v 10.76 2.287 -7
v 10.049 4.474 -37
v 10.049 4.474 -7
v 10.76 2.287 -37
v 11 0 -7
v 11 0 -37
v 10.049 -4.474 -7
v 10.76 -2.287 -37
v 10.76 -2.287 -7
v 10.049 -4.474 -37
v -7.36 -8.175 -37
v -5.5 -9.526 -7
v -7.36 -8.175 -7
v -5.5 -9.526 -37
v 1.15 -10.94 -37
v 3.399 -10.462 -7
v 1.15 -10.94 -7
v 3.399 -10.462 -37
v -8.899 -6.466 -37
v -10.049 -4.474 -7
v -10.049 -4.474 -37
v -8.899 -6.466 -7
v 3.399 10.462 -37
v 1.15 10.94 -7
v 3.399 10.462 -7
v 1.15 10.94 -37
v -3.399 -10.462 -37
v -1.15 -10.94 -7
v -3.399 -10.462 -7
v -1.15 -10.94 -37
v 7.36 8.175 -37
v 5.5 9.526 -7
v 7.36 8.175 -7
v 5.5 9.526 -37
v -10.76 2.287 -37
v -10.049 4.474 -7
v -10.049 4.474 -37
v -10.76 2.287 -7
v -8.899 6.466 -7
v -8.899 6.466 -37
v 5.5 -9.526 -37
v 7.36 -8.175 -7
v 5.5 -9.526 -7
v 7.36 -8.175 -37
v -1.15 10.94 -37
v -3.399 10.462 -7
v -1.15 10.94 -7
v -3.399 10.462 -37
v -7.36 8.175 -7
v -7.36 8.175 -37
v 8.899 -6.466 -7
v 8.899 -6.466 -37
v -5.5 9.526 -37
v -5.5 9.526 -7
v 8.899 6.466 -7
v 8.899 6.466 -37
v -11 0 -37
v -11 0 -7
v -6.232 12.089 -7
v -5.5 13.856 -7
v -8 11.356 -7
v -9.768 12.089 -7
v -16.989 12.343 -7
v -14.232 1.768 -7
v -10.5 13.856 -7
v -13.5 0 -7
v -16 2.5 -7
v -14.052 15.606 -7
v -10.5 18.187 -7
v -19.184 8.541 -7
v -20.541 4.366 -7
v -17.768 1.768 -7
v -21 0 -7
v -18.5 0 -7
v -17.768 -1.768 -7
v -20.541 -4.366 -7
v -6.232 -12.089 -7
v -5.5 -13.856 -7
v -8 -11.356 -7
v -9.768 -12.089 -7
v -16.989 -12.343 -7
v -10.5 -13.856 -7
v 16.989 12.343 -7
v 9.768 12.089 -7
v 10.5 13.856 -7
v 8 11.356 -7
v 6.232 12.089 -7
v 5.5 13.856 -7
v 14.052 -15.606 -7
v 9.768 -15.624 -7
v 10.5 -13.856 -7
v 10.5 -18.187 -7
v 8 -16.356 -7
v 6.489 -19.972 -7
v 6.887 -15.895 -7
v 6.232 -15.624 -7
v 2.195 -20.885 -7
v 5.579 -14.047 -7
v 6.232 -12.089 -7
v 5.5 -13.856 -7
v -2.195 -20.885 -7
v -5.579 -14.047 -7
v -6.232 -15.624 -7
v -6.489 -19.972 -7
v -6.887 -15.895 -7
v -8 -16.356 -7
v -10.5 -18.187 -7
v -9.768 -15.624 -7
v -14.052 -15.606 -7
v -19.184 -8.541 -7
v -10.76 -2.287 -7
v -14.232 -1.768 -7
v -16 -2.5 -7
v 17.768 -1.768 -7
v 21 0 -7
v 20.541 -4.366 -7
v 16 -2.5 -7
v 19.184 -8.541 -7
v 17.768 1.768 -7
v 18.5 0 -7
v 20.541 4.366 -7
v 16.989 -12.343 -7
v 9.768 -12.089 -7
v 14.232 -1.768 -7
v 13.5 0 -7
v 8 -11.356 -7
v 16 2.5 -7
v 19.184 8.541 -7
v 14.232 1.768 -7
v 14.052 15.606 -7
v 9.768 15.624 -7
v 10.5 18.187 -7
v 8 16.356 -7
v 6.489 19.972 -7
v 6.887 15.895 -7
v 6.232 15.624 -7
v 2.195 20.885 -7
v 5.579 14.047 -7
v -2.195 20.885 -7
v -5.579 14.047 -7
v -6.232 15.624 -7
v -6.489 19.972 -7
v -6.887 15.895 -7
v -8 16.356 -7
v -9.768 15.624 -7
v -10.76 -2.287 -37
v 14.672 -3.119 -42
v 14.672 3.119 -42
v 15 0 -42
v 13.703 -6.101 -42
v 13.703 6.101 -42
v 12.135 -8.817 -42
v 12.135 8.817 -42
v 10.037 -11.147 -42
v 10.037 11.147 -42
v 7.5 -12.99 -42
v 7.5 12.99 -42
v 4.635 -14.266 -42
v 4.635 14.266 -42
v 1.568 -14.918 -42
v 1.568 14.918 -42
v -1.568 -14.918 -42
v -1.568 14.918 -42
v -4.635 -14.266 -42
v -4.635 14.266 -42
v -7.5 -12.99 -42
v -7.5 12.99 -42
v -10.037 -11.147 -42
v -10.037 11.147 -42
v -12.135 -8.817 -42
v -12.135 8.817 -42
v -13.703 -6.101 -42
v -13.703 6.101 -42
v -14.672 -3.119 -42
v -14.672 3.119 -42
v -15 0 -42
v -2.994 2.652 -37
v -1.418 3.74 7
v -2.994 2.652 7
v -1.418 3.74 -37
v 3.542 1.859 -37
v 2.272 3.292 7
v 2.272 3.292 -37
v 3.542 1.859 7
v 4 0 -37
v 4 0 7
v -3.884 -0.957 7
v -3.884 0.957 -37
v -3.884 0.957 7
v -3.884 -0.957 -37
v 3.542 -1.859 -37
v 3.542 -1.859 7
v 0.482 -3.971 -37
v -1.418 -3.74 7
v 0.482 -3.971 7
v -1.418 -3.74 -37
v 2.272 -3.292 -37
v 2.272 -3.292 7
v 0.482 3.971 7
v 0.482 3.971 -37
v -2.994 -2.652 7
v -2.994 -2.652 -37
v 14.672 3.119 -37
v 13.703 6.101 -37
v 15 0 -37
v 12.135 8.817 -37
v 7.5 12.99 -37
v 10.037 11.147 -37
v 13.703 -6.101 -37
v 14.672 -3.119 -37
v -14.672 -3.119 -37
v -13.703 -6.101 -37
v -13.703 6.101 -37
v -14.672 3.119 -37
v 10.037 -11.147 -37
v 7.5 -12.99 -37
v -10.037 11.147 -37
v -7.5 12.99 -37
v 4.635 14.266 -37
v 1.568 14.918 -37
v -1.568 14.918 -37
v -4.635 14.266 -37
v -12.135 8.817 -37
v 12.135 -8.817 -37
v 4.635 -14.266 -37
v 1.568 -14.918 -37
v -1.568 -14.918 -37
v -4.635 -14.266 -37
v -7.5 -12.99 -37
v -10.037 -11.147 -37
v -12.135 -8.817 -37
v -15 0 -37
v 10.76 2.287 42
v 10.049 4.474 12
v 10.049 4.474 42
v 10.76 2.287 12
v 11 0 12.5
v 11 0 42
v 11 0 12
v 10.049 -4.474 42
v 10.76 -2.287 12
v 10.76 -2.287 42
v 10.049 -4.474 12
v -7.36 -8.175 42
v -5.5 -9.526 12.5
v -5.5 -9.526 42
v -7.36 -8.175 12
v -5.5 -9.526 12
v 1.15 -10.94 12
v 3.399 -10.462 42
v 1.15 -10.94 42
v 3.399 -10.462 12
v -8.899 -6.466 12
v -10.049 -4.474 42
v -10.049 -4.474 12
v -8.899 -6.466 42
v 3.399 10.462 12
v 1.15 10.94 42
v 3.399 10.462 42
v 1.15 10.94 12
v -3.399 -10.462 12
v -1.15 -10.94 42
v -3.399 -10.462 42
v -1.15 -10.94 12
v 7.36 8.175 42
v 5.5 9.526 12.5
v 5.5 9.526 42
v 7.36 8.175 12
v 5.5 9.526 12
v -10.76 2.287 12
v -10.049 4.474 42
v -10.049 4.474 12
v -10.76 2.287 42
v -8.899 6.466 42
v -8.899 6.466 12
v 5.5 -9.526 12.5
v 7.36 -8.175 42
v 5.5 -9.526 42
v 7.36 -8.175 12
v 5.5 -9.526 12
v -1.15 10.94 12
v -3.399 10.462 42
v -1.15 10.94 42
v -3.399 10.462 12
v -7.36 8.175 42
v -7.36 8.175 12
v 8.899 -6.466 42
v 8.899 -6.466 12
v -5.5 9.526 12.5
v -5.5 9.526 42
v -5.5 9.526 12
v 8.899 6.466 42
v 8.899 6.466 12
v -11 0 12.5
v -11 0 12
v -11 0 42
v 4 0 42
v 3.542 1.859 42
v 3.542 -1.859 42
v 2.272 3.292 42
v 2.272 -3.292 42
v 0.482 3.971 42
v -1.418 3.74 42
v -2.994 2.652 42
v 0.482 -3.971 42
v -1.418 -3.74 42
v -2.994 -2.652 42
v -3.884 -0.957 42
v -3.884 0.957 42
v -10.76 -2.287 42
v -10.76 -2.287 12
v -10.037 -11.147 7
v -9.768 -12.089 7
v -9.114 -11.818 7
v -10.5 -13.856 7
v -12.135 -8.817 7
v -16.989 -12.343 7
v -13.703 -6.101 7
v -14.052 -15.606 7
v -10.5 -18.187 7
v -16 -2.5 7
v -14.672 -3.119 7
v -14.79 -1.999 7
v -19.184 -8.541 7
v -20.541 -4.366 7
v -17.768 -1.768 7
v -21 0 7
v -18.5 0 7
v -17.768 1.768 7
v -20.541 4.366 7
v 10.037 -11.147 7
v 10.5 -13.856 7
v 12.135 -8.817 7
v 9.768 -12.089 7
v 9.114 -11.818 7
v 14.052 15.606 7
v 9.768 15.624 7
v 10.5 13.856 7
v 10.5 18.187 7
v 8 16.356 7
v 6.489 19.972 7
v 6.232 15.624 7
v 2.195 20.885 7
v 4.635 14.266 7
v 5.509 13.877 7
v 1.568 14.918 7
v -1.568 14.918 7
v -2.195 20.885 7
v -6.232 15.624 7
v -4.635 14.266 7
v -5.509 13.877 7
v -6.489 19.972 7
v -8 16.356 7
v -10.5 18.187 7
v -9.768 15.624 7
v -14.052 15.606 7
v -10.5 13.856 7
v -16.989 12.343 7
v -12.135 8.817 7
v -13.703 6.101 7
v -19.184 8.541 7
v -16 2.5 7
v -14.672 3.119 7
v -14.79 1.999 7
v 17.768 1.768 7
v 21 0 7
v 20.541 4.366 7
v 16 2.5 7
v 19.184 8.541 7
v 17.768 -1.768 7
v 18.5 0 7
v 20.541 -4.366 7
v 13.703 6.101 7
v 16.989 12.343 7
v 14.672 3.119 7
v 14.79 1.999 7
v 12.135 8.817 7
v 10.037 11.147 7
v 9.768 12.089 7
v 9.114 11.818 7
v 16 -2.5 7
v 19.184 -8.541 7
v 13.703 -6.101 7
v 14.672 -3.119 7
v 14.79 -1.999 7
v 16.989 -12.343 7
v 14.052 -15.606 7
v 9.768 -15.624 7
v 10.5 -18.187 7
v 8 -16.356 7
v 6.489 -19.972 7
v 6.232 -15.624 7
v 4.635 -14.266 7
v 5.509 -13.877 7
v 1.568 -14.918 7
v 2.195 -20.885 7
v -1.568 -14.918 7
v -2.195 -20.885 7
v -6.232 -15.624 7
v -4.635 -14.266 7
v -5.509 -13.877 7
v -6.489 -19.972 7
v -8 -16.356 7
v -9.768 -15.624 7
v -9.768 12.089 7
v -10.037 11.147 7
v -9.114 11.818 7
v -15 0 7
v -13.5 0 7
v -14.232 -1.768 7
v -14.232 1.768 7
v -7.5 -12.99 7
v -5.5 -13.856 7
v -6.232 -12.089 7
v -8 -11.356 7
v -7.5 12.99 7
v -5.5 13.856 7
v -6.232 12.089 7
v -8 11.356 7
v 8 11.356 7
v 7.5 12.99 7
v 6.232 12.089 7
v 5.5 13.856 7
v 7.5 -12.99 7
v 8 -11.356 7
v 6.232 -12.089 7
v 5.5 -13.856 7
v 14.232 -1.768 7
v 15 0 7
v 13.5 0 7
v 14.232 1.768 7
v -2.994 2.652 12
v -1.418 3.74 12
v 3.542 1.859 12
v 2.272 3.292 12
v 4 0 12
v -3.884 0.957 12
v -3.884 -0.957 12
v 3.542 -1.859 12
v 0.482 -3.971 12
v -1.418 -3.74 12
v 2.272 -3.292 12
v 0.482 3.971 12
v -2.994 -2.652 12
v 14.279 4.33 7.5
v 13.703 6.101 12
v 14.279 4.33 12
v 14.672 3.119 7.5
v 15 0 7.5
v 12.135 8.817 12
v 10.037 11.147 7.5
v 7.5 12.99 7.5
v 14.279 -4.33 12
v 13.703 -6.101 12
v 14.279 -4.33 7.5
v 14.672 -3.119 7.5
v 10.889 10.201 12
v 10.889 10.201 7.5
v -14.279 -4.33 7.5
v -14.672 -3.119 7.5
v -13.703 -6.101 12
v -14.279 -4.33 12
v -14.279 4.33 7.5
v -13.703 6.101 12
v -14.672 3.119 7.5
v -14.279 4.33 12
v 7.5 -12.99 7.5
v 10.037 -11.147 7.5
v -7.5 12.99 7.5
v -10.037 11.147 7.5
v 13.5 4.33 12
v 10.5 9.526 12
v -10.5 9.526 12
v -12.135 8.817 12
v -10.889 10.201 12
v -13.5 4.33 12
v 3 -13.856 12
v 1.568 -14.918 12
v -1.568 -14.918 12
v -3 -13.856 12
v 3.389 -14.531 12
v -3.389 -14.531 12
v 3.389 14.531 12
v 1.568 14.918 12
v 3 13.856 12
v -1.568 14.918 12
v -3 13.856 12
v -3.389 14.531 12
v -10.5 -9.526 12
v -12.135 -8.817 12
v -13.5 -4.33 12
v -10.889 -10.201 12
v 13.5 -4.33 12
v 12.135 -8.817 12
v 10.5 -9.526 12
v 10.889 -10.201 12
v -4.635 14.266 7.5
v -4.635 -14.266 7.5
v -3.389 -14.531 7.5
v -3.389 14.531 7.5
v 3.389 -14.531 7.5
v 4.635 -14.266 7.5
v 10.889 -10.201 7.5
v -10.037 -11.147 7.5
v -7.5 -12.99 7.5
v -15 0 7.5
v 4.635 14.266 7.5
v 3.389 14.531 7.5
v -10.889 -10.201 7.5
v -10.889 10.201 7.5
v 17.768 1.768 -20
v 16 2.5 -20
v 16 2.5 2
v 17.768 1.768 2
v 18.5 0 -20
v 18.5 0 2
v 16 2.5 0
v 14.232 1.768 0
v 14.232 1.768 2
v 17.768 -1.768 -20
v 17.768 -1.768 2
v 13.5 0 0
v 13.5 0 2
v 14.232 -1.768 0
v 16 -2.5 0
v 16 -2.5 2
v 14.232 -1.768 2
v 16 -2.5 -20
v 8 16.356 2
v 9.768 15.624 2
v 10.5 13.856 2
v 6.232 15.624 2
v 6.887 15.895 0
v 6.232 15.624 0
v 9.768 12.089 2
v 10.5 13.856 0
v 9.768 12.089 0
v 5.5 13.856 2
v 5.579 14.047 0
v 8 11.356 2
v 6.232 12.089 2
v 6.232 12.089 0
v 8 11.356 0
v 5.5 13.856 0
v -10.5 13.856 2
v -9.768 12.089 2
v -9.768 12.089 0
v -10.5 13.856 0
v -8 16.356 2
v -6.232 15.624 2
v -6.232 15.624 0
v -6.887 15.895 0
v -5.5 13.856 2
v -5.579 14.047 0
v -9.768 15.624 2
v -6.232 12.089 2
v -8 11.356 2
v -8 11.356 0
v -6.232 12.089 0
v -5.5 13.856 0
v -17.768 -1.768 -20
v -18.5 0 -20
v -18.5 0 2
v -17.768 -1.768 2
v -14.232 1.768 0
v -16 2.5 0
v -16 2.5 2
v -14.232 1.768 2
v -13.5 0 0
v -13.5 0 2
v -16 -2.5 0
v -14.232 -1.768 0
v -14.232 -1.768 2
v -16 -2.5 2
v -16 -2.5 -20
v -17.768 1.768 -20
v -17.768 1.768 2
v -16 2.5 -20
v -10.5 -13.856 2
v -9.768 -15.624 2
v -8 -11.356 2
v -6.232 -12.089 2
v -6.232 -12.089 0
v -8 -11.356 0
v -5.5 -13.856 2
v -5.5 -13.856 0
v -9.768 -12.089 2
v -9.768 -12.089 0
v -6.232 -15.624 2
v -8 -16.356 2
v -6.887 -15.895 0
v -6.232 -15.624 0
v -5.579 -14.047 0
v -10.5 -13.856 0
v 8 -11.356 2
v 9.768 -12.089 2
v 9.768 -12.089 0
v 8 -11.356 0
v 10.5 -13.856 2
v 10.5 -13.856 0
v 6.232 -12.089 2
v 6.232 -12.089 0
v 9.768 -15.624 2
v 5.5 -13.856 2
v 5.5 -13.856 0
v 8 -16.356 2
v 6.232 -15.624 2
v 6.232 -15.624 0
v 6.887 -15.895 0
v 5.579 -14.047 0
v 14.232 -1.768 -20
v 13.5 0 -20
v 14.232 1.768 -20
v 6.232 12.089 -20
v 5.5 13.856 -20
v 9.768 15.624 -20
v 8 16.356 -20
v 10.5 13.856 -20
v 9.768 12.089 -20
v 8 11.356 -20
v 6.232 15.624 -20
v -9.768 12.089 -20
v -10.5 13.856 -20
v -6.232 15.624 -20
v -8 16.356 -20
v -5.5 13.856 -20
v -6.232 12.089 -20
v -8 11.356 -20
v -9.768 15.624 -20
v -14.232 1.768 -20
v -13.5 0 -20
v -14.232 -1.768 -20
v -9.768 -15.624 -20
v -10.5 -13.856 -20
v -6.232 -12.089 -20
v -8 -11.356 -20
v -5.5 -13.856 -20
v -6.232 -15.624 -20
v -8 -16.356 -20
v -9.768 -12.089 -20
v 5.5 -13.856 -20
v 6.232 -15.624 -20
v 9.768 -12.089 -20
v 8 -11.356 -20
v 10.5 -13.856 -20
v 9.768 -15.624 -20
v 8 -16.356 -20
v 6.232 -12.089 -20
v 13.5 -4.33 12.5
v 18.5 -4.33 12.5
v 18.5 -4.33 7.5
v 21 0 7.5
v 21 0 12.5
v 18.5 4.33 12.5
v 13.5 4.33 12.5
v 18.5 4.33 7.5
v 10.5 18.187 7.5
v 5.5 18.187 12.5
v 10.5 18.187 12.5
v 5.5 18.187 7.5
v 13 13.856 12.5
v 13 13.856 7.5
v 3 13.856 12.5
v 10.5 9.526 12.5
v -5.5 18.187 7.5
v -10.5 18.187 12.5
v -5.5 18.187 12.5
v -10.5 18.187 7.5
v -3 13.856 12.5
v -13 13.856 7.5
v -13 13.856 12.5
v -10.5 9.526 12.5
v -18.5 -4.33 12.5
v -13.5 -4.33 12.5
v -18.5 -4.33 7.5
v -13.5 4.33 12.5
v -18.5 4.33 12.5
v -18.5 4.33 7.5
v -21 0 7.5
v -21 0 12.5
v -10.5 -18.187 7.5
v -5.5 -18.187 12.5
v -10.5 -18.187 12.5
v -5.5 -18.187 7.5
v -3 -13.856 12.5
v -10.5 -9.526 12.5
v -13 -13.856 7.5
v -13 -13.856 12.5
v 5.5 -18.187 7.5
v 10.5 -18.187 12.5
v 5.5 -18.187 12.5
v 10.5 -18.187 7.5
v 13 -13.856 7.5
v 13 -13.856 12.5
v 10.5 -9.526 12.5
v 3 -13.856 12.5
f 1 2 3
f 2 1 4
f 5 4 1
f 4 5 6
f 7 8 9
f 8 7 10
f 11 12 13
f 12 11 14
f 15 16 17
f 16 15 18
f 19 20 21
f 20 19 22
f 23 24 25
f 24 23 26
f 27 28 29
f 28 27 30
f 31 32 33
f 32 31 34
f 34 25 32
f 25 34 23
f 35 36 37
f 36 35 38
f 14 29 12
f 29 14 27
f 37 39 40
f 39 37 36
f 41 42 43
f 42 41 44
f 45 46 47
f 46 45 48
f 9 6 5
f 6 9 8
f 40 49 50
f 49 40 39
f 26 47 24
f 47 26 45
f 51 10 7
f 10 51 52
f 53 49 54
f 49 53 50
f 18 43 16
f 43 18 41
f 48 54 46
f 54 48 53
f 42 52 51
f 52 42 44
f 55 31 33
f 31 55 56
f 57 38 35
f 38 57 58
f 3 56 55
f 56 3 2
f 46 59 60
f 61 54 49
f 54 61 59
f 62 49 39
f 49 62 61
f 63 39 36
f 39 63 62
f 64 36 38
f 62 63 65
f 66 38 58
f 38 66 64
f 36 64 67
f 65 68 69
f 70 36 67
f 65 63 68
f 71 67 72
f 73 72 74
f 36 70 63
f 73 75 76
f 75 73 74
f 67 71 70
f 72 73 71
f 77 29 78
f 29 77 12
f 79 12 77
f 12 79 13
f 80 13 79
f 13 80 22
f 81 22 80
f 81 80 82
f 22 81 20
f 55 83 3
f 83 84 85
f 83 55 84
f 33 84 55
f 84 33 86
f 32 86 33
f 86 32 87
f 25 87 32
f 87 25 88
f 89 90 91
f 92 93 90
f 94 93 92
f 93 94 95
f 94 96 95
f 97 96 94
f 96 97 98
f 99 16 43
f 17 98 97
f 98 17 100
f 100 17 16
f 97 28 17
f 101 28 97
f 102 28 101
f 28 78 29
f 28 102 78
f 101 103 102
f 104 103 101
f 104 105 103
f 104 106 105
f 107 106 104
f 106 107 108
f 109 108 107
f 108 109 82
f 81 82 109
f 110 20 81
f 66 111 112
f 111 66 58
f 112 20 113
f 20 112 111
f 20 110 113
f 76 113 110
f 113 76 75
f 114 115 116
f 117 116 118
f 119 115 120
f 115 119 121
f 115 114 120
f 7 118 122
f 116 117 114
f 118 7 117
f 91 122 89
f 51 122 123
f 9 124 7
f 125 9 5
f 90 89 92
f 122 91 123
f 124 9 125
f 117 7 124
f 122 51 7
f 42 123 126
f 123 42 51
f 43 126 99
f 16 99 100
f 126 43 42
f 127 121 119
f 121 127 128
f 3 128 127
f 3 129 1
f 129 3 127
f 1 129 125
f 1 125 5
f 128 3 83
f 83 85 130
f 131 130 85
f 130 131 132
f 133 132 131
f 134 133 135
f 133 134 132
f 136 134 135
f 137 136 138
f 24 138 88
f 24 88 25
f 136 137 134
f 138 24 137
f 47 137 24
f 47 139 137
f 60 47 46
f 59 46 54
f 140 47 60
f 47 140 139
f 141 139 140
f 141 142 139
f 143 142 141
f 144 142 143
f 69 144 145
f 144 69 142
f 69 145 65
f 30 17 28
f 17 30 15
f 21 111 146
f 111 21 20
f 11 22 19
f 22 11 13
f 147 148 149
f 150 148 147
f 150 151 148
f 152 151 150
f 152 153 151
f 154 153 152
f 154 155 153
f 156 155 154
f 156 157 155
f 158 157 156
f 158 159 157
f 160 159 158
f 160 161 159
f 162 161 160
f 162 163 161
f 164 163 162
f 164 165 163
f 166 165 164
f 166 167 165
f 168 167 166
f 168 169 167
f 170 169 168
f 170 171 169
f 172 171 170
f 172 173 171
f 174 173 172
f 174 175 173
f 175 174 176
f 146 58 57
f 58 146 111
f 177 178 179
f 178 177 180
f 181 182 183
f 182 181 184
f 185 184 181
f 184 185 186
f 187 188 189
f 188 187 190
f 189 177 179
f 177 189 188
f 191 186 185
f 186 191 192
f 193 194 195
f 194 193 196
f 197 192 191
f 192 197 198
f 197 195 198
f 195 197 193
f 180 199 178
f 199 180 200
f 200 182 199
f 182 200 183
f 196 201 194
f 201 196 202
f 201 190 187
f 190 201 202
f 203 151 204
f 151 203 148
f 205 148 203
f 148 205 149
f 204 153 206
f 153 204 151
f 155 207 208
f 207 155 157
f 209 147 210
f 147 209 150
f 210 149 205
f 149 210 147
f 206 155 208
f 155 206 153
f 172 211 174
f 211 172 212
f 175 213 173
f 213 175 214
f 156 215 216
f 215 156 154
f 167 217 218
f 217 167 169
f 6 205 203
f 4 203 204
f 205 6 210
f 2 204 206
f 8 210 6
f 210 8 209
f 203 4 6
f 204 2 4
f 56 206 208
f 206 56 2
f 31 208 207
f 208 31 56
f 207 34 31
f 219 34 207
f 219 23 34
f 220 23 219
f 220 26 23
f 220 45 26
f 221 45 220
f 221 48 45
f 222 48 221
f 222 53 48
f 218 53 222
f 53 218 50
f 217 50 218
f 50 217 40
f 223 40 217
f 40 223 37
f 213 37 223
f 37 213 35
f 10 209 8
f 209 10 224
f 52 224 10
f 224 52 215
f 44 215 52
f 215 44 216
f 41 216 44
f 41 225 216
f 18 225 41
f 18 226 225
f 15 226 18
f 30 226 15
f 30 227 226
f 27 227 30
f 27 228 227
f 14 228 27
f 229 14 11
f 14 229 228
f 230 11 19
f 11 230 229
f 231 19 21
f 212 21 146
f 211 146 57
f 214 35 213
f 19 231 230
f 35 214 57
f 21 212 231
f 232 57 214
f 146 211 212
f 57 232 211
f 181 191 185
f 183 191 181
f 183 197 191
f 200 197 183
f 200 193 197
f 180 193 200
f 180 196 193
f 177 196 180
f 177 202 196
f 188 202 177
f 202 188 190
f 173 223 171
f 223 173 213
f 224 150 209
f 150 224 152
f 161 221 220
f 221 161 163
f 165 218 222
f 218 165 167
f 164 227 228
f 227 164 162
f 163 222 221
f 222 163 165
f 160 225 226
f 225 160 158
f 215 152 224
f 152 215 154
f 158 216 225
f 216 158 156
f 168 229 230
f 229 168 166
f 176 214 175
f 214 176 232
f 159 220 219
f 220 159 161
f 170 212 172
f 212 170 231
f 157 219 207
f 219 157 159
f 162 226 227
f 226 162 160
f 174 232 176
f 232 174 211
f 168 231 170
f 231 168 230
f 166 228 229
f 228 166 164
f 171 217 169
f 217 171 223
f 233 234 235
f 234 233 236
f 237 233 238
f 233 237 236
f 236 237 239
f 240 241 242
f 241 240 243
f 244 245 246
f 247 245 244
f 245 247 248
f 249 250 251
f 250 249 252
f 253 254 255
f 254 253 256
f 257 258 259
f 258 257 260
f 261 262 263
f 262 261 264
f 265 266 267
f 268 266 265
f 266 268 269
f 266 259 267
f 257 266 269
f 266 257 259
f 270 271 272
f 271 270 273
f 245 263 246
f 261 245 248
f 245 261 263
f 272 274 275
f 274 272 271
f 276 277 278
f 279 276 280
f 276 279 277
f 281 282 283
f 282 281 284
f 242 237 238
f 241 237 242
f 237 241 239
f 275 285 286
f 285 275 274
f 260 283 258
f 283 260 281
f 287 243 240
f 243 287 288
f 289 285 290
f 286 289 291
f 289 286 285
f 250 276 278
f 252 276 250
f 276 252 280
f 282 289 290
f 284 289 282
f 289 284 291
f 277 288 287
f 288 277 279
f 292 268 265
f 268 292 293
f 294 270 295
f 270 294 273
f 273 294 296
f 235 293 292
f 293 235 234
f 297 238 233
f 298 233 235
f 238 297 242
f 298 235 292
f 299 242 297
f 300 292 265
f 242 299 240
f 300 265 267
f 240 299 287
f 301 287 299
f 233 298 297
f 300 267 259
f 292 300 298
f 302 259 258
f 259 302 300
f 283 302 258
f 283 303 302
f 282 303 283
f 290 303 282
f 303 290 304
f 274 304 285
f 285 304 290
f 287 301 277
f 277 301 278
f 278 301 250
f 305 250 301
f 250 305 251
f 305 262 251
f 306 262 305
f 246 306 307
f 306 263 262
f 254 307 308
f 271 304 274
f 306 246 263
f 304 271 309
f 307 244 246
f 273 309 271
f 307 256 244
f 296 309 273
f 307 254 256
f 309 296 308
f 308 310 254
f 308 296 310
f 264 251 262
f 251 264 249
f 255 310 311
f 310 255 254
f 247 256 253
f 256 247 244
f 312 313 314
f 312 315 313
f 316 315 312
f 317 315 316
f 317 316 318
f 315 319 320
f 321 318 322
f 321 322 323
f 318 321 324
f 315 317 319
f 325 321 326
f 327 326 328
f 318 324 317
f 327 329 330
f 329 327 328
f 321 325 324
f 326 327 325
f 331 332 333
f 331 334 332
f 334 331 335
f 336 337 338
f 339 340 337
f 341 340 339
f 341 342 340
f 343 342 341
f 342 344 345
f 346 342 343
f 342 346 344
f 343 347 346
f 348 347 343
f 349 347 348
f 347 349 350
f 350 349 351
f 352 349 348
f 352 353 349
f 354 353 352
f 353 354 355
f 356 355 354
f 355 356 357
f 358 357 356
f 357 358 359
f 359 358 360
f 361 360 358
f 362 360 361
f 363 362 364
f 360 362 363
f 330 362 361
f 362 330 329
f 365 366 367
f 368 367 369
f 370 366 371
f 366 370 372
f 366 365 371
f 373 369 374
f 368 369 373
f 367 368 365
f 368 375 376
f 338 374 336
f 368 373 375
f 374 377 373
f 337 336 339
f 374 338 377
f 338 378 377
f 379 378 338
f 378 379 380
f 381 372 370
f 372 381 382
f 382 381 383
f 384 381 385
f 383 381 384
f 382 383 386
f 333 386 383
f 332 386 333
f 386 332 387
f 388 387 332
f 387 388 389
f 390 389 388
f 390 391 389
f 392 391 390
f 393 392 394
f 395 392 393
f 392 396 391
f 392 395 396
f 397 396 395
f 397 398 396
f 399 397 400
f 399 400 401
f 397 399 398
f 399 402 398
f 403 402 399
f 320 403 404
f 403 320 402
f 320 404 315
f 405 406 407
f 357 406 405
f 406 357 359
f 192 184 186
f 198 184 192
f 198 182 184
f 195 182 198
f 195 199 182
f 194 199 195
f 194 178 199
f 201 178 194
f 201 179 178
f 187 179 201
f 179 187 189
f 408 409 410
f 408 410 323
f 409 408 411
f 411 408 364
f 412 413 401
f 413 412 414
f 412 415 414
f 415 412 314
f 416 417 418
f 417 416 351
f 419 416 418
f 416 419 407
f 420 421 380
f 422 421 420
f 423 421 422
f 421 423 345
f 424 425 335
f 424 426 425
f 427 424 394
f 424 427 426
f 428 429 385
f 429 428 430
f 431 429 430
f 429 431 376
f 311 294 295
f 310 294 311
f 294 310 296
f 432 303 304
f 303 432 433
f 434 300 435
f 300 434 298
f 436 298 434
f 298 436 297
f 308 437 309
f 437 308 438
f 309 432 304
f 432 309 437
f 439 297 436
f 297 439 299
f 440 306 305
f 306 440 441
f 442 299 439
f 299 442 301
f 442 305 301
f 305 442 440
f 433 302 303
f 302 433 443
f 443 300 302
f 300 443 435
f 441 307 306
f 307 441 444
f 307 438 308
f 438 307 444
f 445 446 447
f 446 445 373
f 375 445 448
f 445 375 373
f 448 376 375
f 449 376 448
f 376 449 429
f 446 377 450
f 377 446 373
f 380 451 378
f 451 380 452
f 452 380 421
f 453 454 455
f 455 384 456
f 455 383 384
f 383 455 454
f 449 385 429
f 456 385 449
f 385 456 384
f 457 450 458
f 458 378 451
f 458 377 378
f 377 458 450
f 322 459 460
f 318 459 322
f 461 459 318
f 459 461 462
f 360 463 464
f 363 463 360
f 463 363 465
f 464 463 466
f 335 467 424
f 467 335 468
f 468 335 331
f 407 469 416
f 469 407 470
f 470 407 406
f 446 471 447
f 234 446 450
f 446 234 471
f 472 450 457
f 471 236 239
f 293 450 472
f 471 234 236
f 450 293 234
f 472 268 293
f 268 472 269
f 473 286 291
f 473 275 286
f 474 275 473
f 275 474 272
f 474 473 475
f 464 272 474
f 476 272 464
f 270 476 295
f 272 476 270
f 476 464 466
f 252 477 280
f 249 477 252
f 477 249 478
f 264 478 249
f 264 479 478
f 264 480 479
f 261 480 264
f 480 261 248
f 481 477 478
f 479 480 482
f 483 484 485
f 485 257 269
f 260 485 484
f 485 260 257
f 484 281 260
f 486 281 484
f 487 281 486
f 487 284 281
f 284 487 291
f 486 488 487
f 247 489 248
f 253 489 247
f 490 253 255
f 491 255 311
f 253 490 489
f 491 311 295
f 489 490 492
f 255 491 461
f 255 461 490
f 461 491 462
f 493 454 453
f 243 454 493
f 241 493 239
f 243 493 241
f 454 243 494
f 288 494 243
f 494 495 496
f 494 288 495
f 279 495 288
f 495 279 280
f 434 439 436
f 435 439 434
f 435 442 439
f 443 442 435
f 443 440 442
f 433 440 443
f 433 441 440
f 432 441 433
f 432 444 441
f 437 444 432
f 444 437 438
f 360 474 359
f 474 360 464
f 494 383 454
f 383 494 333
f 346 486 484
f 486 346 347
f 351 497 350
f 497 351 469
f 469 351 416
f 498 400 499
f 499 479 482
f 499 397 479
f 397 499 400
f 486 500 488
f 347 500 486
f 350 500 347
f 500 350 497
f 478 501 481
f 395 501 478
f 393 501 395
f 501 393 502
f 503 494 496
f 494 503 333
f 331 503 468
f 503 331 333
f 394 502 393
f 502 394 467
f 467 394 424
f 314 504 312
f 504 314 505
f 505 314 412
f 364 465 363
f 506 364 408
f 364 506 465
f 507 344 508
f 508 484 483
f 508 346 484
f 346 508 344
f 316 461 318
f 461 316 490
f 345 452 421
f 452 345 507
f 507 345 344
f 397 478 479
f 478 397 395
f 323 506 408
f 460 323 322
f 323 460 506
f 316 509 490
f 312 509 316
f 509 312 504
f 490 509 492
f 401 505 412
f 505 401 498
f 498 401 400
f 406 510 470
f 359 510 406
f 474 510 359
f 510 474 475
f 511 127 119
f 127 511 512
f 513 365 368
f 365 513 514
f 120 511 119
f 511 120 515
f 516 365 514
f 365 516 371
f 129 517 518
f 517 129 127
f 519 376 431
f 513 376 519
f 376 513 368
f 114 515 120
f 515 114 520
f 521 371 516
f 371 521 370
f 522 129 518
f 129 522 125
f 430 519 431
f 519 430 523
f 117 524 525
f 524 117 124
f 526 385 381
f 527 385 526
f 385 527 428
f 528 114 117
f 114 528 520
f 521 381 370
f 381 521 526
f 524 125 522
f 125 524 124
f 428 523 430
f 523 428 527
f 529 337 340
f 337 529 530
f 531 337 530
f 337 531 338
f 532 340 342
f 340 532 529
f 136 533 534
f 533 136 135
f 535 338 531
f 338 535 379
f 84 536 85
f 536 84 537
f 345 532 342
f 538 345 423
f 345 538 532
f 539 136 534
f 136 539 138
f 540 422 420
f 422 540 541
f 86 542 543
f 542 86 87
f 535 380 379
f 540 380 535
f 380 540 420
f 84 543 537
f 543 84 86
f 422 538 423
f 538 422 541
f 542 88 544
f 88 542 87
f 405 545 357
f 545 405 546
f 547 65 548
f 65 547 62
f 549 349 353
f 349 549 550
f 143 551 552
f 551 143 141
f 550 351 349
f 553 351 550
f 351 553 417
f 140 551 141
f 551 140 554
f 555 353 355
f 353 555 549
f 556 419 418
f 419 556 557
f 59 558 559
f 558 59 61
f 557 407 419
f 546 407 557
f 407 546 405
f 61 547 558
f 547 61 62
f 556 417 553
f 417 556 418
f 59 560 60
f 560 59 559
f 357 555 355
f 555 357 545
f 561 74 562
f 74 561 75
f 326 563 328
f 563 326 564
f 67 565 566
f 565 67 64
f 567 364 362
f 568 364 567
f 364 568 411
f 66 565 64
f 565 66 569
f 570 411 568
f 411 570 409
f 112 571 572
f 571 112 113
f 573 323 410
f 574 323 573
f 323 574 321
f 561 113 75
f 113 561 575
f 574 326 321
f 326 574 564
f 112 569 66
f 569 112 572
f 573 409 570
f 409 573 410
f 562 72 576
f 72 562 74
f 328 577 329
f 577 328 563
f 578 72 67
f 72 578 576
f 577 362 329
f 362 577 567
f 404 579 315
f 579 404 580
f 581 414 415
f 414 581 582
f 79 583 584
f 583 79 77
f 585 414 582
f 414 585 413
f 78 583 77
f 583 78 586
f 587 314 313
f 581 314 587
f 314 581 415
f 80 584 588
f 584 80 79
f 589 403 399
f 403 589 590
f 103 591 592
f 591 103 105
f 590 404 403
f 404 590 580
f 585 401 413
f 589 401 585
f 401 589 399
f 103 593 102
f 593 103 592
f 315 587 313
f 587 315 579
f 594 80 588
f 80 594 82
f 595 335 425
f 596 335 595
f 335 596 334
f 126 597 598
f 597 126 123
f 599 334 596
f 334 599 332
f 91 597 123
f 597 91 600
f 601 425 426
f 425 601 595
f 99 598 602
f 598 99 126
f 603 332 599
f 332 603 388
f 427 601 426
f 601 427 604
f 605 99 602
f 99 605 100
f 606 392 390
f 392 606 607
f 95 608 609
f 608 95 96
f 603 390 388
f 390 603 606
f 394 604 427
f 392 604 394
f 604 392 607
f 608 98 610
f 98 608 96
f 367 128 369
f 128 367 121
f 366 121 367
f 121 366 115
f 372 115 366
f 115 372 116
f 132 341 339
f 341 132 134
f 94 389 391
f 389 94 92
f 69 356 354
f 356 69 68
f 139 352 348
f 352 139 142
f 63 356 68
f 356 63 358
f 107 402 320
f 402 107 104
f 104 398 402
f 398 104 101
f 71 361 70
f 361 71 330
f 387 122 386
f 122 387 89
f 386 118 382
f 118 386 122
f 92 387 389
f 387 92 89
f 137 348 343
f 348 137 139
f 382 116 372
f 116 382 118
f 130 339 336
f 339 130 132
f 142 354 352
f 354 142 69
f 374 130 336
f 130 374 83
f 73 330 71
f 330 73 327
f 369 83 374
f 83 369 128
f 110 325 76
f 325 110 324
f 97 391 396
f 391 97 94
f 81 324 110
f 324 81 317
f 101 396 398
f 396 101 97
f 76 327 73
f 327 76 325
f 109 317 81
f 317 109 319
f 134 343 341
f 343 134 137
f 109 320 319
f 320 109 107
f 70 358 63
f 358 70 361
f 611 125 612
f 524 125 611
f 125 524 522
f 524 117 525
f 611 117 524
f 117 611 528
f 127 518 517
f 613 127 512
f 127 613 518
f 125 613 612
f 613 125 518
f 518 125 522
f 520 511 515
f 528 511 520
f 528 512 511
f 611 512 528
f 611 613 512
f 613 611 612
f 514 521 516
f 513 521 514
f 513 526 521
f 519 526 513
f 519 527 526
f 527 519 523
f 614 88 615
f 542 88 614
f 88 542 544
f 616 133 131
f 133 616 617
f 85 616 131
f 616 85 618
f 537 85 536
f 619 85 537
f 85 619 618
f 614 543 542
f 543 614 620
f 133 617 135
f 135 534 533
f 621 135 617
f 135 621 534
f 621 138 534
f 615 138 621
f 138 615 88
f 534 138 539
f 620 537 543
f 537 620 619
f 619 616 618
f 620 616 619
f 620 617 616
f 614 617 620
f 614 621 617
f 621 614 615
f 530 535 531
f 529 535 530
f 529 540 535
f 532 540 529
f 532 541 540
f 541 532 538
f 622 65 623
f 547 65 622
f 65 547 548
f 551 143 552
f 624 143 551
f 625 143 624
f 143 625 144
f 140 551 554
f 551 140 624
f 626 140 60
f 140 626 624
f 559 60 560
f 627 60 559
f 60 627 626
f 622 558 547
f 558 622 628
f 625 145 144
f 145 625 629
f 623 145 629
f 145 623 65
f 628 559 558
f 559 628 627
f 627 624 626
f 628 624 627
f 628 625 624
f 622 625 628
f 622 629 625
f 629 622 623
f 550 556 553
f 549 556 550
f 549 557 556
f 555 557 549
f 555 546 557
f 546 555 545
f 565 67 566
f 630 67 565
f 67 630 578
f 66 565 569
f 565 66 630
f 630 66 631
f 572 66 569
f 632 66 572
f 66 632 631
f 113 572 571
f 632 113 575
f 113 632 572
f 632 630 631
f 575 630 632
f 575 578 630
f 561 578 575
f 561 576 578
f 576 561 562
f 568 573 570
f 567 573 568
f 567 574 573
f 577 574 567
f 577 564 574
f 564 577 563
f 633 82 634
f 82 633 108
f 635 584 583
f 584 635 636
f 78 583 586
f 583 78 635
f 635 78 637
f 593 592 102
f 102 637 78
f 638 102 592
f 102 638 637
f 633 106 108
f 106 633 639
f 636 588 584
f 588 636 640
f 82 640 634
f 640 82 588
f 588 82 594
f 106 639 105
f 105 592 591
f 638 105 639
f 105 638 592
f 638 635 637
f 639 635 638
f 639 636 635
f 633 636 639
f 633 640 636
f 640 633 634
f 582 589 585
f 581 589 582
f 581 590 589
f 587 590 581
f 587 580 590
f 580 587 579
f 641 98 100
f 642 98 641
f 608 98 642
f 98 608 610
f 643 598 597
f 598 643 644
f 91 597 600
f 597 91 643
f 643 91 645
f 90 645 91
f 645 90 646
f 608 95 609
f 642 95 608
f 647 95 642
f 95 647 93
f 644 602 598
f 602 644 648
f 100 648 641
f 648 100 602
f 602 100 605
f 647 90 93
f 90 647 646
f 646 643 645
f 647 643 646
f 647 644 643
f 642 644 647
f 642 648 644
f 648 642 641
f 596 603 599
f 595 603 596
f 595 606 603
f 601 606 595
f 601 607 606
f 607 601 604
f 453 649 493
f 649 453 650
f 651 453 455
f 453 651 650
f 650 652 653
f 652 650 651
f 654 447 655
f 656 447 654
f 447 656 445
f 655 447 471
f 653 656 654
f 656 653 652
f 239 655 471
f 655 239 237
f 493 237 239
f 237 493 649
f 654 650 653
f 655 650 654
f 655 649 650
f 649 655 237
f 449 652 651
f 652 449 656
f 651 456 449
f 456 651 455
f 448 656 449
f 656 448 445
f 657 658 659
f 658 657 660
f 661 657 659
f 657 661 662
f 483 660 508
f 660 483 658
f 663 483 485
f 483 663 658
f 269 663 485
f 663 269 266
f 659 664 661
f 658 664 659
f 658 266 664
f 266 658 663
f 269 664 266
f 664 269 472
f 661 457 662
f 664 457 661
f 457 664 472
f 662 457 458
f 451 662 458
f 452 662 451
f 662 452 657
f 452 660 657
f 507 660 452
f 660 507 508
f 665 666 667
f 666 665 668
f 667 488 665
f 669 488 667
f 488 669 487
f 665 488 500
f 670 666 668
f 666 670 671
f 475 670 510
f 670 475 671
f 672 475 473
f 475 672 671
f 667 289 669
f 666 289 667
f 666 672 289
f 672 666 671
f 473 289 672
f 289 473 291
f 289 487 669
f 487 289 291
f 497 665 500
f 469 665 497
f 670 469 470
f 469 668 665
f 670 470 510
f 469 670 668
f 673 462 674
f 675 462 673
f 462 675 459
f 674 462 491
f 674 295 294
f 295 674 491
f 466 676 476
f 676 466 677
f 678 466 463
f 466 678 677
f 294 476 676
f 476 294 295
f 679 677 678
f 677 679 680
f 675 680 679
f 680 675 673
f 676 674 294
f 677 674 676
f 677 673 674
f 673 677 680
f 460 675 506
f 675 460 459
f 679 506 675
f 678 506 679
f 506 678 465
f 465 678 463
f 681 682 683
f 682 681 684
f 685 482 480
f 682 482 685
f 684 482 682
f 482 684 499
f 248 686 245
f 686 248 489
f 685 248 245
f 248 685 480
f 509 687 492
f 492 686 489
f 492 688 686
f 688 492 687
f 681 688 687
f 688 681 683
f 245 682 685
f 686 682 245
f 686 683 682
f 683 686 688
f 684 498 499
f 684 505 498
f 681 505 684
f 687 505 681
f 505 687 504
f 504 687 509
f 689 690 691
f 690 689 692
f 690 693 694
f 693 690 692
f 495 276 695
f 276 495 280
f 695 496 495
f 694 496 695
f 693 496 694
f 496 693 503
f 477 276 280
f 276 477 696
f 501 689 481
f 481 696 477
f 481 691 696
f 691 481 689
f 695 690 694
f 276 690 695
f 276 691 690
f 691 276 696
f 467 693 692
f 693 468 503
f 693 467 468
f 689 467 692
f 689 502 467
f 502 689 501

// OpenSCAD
// Parameters
shaft_length = 35; // Shortened shaft
shaft_diameter = 22; // Slightly increased diameter
shaft_hole_diameter = 8;
shaft_wider_end_diameter = 30; // More pronounced wider end
shaft_wider_end_thickness = 5; // Flatter circular face
flange_diameter = 42; // Slightly increased flange size
flange_thickness = 7; // Increased thickness
bolt_hole_diameter = 5;
bolt_count = 6;
bolt_length = 20; // Increased bolt length
bolt_diameter = 5;
nut_diameter = 10; // Increased nut size
nut_thickness = 5; // Increased nut thickness
diaphragm_thickness = 2; // More visible flexible diaphragm
diaphragm_diameter = 40; // Adjusted diaphragm size
bolt_circle_radius = 16; // Adjusted bolt circle radius

// Function to create a shaft with a wider end
module shaft() {
    union() {
        difference() {
            cylinder(h = shaft_length, d = shaft_diameter, center = true);
            cylinder(h = shaft_length + 2, d = shaft_hole_diameter, center = true);
        }
        // Wider end
        translate([0, 0, -shaft_length/2])
            cylinder(h = shaft_wider_end_thickness, d = shaft_wider_end_diameter, center = false);
    }
}

// Function to create a flange plate
module flange_plate() {
    difference() {
        cylinder(h = flange_thickness, d = flange_diameter, center = true);
        cylinder(h = flange_thickness + 2, d = shaft_hole_diameter, center = true);
        
        // Bolt holes
        for (i = [0:bolt_count-1]) {
            angle = i * 360 / bolt_count;
            translate([bolt_circle_radius * cos(angle), bolt_circle_radius * sin(angle), 0])
                cylinder(h = flange_thickness + 2, d = bolt_hole_diameter, center = true);
        }
    }
}

// Function to create the flexible diaphragm
module flexible_diaphragm() {
    difference() {
        cylinder(h = diaphragm_thickness, d = diaphragm_diameter, center = true);
        cylinder(h = diaphragm_thickness + 2, d = shaft_hole_diameter, center = true);
        
        // Bolt holes
        for (i = [0:bolt_count-1]) {
            angle = i * 360 / bolt_count;
            translate([bolt_circle_radius * cos(angle), bolt_circle_radius * sin(angle), 0])
                cylinder(h = diaphragm_thickness + 2, d = bolt_hole_diameter, center = true);
        }
    }
}

// Function to create a bolt
module bolt() {
    union() {
        cylinder(h = bolt_length, d = bolt_diameter, center = true);
        translate([0, 0, bolt_length/2])
            cylinder(h = 2, d = bolt_diameter + 2, center = false); // Bolt head
    }
}

// Function to create a nut
module nut() {
    cylinder(h = nut_thickness, d = nut_diameter, center = true, $fn=6);
}

// Assembly
module coupling_assembly() {
    // Left Shaft
    translate([0, 0, -shaft_length/2 - flange_thickness])
        shaft();
    
    // Right Shaft
    translate([0, 0, shaft_length/2 + flange_thickness])
        shaft();
    
    // Left Flange Plate
    translate([0, 0, -flange_thickness/2])
        flange_plate();
    
    // Right Flange Plate
    translate([0, 0, flange_thickness/2])
        flange_plate();
    
    // Flexible Diaphragm
    translate([0, 0, 0])
        flexible_diaphragm();
    
    // Bolts and Nuts
    for (i = [0:bolt_count-1]) {
        angle = i * 360 / bolt_count;
        translate([bolt_circle_radius * cos(angle), bolt_circle_radius * sin(angle), -bolt_length/2])
            bolt();
        translate([bolt_circle_radius * cos(angle), bolt_circle_radius * sin(angle), bolt_length/2])
            nut();
    }
}

// Render the coupling assembly
coupling_assembly();
